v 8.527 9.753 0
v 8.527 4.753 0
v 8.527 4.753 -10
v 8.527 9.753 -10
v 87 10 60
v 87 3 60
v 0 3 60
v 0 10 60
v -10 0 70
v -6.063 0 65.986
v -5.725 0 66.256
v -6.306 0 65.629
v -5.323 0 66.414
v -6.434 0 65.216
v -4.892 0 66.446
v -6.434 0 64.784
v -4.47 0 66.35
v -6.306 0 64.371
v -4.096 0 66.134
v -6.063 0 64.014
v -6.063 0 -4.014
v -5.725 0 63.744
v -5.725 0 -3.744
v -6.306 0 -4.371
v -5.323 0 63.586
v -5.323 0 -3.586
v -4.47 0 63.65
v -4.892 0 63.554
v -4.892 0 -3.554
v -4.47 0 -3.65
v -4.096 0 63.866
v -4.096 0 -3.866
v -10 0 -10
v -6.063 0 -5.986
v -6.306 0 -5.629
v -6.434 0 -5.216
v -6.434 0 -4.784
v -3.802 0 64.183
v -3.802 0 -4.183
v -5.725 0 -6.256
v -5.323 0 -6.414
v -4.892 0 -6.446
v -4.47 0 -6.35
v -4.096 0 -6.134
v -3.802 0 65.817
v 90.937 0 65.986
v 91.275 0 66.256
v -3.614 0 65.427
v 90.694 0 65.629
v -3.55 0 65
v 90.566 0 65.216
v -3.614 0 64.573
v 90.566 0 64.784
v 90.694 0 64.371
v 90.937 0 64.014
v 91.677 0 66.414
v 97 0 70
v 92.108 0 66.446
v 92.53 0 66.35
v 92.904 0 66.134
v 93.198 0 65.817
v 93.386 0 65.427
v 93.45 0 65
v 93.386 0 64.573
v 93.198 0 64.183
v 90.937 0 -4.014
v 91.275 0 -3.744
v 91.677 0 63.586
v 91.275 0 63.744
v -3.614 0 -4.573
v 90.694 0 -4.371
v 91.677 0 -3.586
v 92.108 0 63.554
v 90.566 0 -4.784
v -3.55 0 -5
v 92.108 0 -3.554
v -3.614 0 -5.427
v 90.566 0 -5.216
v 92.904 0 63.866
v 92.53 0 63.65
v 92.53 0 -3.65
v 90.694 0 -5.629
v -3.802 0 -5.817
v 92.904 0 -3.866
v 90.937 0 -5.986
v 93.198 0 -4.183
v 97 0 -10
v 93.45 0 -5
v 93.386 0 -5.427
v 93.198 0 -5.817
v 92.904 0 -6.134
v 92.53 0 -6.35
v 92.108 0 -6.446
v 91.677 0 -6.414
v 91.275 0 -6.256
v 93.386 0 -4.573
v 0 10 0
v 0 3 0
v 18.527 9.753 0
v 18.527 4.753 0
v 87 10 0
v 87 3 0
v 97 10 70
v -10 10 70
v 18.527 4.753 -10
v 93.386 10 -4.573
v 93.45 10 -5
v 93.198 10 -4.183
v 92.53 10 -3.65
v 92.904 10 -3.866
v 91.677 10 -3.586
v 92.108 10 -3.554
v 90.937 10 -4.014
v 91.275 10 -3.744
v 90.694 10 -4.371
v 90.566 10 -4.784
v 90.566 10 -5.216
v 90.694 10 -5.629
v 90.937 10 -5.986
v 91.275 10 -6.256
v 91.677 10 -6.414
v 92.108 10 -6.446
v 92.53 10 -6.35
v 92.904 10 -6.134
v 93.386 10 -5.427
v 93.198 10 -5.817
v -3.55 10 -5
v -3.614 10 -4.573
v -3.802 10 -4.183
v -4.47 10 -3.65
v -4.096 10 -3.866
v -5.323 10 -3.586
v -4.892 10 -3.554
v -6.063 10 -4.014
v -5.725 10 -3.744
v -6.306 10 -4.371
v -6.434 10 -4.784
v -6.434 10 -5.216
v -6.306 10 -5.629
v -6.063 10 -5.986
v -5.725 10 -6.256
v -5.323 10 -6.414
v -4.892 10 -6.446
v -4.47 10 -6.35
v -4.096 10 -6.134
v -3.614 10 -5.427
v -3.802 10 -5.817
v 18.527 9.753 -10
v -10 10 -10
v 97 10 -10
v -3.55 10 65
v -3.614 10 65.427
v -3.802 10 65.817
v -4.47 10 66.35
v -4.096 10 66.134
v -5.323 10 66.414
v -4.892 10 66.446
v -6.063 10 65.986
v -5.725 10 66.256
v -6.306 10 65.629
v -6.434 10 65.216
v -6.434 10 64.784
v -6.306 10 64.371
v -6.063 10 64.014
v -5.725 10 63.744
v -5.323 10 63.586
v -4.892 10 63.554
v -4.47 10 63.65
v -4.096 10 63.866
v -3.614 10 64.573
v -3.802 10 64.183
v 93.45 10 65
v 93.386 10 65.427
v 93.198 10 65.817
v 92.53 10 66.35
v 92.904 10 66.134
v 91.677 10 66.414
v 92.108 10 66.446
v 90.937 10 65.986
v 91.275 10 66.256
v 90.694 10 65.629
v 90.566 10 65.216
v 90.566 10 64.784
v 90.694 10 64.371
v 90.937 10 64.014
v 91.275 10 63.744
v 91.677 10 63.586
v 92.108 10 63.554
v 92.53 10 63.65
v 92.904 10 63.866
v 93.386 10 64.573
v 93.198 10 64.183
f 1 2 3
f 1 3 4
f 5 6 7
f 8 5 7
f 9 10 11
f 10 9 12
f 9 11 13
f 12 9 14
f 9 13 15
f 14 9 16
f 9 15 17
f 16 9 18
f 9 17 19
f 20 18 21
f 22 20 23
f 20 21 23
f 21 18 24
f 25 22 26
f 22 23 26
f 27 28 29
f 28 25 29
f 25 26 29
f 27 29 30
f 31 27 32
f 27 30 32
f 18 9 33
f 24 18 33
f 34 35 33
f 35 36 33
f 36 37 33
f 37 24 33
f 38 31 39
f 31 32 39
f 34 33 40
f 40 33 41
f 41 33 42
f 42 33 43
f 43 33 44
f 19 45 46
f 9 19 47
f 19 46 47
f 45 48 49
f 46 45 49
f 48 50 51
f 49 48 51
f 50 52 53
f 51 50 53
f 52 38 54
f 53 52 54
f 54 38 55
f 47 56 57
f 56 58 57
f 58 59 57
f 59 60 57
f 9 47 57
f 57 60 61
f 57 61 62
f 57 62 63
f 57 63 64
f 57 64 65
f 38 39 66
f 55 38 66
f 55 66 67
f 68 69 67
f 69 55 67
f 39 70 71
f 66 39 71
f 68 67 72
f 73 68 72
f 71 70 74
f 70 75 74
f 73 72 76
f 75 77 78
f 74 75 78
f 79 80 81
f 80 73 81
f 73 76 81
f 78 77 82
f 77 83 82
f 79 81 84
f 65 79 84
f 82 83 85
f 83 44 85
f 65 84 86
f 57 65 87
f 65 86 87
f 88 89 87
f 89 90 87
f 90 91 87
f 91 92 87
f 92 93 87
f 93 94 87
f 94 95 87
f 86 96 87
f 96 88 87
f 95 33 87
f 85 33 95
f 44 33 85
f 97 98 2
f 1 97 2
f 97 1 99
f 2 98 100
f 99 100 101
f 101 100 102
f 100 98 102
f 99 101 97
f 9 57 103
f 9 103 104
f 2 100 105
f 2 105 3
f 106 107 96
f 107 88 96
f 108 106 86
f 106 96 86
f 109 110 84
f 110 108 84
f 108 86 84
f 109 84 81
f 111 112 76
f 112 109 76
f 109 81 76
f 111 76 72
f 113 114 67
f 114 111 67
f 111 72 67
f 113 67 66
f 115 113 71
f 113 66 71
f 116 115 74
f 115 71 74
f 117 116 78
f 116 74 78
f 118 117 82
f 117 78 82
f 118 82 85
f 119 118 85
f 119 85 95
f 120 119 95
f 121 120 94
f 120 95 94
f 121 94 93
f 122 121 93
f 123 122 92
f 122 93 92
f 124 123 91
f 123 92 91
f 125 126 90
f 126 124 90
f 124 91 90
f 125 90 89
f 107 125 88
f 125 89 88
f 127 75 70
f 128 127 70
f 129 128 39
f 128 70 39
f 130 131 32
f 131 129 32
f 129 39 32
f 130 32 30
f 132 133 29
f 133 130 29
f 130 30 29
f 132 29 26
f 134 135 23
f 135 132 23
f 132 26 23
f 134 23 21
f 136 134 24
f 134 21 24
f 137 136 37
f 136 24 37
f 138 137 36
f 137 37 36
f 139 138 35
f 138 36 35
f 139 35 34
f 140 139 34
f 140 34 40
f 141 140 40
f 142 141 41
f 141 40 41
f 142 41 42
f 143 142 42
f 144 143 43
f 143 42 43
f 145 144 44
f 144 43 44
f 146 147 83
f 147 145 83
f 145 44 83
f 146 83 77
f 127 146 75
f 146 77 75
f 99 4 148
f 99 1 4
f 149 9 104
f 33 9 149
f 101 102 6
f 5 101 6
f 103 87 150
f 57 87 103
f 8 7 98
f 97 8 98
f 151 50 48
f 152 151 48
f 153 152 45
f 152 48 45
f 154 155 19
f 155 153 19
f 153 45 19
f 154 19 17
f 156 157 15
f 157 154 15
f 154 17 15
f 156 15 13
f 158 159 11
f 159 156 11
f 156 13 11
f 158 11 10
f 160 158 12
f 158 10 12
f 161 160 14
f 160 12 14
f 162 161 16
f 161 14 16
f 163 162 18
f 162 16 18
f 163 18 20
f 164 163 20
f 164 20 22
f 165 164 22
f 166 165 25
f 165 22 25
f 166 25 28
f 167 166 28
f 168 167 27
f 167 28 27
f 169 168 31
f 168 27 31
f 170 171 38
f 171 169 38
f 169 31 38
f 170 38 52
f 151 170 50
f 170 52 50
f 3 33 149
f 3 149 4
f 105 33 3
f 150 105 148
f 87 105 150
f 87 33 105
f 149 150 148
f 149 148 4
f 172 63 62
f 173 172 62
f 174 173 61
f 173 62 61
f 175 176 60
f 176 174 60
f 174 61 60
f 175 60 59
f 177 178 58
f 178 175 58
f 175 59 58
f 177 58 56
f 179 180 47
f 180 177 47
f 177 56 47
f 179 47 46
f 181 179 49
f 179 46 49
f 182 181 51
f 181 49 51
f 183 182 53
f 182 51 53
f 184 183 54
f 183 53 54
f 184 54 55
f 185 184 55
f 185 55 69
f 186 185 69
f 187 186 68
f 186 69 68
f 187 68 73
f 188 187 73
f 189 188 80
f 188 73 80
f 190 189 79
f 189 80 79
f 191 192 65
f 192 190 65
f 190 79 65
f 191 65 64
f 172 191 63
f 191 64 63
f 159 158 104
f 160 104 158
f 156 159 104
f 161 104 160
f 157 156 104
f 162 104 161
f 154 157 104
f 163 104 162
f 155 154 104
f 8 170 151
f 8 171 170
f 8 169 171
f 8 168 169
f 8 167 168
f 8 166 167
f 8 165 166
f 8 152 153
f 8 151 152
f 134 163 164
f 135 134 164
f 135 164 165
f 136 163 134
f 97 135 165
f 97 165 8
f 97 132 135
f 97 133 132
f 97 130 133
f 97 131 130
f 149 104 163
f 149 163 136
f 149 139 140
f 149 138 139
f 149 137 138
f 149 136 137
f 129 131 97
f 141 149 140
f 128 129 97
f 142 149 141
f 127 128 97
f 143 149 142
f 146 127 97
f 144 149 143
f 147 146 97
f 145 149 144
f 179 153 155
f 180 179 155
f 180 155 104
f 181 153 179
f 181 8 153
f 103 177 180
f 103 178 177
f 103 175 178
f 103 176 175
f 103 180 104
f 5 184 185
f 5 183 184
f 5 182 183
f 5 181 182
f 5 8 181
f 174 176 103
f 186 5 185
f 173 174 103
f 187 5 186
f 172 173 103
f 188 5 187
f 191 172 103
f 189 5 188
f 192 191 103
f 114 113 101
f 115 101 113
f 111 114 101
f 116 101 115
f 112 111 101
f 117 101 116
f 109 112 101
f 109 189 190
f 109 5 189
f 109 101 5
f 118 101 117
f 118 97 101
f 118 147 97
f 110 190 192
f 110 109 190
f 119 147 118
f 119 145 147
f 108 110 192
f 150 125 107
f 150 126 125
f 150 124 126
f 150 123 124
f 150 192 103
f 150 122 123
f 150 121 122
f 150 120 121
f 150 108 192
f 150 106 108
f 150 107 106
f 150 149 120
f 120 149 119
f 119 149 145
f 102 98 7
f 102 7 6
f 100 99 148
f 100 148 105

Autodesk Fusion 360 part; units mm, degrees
sketch "Sketch1" plane through (0, 0, 0) normal (0, 1, 0) x (1, 0, 0)
  line L0 (0, 0) -> (87, 0)
  line L1 (87, 0) -> (87, -60)
  line L2 (87, -60) -> (0, -60)
  line L3 (0, -60) -> (0, 0)
  line L4 (-10, 10) -> (97, 10)
  line L5 (97, 10) -> (97, -70)
  line L6 (97, -70) -> (-10, -70)
  line L7 (-10, -70) -> (-10, 10)
  circle A0 centre (-5, 5) radius 1.45
  circle A1 centre (-5, -65) radius 1.45
  circle A2 centre (92, -65) radius 1.45
  circle A3 centre (92, 5) radius 1.45
  dimension "d1" = 87
  dimension "d2" = 60
  dimension "d3" = 107
  dimension "d4" = 80
  dimension "d5" = 10
  dimension "d6" = 2.9
  dimension "d7" = 5
  dimension "d8" = 2.9
  dimension "d9" = 5
  dimension "d10" = 5
  dimension "d11" = 2.9
  dimension "d12" = 5
  dimension "d13" = 5
  dimension "d14" = 2.9
  dimension "d15" = 5
  dimension "d16" = 5
extrude "Extrude1" add sketch "Sketch1" along normal blind 3 contours L0 L1 L2 L3 | L4 L5 L6 L7
extrude "Extrude2" cut sketch "Sketch1" along normal blind 10
extrude "Extrude3" add sketch "Sketch1" along normal blind 10
sketch "Sketch3" plane through (0, 0, 0) normal (0, 0, 1) x (1, 0, 0)
  line L0 (8.5266, 9.753) -> (18.5266, 9.753)
  line L1 (18.5266, 9.753) -> (18.5266, 4.753)
  line L2 (18.5266, 4.753) -> (8.5266, 4.753)
  line L3 (8.5266, 4.753) -> (8.5266, 9.753)
  dimension "d23" = 10
  dimension "d24" = 5
extrude "Extrude4" cut sketch "Sketch3" against normal blind 10
